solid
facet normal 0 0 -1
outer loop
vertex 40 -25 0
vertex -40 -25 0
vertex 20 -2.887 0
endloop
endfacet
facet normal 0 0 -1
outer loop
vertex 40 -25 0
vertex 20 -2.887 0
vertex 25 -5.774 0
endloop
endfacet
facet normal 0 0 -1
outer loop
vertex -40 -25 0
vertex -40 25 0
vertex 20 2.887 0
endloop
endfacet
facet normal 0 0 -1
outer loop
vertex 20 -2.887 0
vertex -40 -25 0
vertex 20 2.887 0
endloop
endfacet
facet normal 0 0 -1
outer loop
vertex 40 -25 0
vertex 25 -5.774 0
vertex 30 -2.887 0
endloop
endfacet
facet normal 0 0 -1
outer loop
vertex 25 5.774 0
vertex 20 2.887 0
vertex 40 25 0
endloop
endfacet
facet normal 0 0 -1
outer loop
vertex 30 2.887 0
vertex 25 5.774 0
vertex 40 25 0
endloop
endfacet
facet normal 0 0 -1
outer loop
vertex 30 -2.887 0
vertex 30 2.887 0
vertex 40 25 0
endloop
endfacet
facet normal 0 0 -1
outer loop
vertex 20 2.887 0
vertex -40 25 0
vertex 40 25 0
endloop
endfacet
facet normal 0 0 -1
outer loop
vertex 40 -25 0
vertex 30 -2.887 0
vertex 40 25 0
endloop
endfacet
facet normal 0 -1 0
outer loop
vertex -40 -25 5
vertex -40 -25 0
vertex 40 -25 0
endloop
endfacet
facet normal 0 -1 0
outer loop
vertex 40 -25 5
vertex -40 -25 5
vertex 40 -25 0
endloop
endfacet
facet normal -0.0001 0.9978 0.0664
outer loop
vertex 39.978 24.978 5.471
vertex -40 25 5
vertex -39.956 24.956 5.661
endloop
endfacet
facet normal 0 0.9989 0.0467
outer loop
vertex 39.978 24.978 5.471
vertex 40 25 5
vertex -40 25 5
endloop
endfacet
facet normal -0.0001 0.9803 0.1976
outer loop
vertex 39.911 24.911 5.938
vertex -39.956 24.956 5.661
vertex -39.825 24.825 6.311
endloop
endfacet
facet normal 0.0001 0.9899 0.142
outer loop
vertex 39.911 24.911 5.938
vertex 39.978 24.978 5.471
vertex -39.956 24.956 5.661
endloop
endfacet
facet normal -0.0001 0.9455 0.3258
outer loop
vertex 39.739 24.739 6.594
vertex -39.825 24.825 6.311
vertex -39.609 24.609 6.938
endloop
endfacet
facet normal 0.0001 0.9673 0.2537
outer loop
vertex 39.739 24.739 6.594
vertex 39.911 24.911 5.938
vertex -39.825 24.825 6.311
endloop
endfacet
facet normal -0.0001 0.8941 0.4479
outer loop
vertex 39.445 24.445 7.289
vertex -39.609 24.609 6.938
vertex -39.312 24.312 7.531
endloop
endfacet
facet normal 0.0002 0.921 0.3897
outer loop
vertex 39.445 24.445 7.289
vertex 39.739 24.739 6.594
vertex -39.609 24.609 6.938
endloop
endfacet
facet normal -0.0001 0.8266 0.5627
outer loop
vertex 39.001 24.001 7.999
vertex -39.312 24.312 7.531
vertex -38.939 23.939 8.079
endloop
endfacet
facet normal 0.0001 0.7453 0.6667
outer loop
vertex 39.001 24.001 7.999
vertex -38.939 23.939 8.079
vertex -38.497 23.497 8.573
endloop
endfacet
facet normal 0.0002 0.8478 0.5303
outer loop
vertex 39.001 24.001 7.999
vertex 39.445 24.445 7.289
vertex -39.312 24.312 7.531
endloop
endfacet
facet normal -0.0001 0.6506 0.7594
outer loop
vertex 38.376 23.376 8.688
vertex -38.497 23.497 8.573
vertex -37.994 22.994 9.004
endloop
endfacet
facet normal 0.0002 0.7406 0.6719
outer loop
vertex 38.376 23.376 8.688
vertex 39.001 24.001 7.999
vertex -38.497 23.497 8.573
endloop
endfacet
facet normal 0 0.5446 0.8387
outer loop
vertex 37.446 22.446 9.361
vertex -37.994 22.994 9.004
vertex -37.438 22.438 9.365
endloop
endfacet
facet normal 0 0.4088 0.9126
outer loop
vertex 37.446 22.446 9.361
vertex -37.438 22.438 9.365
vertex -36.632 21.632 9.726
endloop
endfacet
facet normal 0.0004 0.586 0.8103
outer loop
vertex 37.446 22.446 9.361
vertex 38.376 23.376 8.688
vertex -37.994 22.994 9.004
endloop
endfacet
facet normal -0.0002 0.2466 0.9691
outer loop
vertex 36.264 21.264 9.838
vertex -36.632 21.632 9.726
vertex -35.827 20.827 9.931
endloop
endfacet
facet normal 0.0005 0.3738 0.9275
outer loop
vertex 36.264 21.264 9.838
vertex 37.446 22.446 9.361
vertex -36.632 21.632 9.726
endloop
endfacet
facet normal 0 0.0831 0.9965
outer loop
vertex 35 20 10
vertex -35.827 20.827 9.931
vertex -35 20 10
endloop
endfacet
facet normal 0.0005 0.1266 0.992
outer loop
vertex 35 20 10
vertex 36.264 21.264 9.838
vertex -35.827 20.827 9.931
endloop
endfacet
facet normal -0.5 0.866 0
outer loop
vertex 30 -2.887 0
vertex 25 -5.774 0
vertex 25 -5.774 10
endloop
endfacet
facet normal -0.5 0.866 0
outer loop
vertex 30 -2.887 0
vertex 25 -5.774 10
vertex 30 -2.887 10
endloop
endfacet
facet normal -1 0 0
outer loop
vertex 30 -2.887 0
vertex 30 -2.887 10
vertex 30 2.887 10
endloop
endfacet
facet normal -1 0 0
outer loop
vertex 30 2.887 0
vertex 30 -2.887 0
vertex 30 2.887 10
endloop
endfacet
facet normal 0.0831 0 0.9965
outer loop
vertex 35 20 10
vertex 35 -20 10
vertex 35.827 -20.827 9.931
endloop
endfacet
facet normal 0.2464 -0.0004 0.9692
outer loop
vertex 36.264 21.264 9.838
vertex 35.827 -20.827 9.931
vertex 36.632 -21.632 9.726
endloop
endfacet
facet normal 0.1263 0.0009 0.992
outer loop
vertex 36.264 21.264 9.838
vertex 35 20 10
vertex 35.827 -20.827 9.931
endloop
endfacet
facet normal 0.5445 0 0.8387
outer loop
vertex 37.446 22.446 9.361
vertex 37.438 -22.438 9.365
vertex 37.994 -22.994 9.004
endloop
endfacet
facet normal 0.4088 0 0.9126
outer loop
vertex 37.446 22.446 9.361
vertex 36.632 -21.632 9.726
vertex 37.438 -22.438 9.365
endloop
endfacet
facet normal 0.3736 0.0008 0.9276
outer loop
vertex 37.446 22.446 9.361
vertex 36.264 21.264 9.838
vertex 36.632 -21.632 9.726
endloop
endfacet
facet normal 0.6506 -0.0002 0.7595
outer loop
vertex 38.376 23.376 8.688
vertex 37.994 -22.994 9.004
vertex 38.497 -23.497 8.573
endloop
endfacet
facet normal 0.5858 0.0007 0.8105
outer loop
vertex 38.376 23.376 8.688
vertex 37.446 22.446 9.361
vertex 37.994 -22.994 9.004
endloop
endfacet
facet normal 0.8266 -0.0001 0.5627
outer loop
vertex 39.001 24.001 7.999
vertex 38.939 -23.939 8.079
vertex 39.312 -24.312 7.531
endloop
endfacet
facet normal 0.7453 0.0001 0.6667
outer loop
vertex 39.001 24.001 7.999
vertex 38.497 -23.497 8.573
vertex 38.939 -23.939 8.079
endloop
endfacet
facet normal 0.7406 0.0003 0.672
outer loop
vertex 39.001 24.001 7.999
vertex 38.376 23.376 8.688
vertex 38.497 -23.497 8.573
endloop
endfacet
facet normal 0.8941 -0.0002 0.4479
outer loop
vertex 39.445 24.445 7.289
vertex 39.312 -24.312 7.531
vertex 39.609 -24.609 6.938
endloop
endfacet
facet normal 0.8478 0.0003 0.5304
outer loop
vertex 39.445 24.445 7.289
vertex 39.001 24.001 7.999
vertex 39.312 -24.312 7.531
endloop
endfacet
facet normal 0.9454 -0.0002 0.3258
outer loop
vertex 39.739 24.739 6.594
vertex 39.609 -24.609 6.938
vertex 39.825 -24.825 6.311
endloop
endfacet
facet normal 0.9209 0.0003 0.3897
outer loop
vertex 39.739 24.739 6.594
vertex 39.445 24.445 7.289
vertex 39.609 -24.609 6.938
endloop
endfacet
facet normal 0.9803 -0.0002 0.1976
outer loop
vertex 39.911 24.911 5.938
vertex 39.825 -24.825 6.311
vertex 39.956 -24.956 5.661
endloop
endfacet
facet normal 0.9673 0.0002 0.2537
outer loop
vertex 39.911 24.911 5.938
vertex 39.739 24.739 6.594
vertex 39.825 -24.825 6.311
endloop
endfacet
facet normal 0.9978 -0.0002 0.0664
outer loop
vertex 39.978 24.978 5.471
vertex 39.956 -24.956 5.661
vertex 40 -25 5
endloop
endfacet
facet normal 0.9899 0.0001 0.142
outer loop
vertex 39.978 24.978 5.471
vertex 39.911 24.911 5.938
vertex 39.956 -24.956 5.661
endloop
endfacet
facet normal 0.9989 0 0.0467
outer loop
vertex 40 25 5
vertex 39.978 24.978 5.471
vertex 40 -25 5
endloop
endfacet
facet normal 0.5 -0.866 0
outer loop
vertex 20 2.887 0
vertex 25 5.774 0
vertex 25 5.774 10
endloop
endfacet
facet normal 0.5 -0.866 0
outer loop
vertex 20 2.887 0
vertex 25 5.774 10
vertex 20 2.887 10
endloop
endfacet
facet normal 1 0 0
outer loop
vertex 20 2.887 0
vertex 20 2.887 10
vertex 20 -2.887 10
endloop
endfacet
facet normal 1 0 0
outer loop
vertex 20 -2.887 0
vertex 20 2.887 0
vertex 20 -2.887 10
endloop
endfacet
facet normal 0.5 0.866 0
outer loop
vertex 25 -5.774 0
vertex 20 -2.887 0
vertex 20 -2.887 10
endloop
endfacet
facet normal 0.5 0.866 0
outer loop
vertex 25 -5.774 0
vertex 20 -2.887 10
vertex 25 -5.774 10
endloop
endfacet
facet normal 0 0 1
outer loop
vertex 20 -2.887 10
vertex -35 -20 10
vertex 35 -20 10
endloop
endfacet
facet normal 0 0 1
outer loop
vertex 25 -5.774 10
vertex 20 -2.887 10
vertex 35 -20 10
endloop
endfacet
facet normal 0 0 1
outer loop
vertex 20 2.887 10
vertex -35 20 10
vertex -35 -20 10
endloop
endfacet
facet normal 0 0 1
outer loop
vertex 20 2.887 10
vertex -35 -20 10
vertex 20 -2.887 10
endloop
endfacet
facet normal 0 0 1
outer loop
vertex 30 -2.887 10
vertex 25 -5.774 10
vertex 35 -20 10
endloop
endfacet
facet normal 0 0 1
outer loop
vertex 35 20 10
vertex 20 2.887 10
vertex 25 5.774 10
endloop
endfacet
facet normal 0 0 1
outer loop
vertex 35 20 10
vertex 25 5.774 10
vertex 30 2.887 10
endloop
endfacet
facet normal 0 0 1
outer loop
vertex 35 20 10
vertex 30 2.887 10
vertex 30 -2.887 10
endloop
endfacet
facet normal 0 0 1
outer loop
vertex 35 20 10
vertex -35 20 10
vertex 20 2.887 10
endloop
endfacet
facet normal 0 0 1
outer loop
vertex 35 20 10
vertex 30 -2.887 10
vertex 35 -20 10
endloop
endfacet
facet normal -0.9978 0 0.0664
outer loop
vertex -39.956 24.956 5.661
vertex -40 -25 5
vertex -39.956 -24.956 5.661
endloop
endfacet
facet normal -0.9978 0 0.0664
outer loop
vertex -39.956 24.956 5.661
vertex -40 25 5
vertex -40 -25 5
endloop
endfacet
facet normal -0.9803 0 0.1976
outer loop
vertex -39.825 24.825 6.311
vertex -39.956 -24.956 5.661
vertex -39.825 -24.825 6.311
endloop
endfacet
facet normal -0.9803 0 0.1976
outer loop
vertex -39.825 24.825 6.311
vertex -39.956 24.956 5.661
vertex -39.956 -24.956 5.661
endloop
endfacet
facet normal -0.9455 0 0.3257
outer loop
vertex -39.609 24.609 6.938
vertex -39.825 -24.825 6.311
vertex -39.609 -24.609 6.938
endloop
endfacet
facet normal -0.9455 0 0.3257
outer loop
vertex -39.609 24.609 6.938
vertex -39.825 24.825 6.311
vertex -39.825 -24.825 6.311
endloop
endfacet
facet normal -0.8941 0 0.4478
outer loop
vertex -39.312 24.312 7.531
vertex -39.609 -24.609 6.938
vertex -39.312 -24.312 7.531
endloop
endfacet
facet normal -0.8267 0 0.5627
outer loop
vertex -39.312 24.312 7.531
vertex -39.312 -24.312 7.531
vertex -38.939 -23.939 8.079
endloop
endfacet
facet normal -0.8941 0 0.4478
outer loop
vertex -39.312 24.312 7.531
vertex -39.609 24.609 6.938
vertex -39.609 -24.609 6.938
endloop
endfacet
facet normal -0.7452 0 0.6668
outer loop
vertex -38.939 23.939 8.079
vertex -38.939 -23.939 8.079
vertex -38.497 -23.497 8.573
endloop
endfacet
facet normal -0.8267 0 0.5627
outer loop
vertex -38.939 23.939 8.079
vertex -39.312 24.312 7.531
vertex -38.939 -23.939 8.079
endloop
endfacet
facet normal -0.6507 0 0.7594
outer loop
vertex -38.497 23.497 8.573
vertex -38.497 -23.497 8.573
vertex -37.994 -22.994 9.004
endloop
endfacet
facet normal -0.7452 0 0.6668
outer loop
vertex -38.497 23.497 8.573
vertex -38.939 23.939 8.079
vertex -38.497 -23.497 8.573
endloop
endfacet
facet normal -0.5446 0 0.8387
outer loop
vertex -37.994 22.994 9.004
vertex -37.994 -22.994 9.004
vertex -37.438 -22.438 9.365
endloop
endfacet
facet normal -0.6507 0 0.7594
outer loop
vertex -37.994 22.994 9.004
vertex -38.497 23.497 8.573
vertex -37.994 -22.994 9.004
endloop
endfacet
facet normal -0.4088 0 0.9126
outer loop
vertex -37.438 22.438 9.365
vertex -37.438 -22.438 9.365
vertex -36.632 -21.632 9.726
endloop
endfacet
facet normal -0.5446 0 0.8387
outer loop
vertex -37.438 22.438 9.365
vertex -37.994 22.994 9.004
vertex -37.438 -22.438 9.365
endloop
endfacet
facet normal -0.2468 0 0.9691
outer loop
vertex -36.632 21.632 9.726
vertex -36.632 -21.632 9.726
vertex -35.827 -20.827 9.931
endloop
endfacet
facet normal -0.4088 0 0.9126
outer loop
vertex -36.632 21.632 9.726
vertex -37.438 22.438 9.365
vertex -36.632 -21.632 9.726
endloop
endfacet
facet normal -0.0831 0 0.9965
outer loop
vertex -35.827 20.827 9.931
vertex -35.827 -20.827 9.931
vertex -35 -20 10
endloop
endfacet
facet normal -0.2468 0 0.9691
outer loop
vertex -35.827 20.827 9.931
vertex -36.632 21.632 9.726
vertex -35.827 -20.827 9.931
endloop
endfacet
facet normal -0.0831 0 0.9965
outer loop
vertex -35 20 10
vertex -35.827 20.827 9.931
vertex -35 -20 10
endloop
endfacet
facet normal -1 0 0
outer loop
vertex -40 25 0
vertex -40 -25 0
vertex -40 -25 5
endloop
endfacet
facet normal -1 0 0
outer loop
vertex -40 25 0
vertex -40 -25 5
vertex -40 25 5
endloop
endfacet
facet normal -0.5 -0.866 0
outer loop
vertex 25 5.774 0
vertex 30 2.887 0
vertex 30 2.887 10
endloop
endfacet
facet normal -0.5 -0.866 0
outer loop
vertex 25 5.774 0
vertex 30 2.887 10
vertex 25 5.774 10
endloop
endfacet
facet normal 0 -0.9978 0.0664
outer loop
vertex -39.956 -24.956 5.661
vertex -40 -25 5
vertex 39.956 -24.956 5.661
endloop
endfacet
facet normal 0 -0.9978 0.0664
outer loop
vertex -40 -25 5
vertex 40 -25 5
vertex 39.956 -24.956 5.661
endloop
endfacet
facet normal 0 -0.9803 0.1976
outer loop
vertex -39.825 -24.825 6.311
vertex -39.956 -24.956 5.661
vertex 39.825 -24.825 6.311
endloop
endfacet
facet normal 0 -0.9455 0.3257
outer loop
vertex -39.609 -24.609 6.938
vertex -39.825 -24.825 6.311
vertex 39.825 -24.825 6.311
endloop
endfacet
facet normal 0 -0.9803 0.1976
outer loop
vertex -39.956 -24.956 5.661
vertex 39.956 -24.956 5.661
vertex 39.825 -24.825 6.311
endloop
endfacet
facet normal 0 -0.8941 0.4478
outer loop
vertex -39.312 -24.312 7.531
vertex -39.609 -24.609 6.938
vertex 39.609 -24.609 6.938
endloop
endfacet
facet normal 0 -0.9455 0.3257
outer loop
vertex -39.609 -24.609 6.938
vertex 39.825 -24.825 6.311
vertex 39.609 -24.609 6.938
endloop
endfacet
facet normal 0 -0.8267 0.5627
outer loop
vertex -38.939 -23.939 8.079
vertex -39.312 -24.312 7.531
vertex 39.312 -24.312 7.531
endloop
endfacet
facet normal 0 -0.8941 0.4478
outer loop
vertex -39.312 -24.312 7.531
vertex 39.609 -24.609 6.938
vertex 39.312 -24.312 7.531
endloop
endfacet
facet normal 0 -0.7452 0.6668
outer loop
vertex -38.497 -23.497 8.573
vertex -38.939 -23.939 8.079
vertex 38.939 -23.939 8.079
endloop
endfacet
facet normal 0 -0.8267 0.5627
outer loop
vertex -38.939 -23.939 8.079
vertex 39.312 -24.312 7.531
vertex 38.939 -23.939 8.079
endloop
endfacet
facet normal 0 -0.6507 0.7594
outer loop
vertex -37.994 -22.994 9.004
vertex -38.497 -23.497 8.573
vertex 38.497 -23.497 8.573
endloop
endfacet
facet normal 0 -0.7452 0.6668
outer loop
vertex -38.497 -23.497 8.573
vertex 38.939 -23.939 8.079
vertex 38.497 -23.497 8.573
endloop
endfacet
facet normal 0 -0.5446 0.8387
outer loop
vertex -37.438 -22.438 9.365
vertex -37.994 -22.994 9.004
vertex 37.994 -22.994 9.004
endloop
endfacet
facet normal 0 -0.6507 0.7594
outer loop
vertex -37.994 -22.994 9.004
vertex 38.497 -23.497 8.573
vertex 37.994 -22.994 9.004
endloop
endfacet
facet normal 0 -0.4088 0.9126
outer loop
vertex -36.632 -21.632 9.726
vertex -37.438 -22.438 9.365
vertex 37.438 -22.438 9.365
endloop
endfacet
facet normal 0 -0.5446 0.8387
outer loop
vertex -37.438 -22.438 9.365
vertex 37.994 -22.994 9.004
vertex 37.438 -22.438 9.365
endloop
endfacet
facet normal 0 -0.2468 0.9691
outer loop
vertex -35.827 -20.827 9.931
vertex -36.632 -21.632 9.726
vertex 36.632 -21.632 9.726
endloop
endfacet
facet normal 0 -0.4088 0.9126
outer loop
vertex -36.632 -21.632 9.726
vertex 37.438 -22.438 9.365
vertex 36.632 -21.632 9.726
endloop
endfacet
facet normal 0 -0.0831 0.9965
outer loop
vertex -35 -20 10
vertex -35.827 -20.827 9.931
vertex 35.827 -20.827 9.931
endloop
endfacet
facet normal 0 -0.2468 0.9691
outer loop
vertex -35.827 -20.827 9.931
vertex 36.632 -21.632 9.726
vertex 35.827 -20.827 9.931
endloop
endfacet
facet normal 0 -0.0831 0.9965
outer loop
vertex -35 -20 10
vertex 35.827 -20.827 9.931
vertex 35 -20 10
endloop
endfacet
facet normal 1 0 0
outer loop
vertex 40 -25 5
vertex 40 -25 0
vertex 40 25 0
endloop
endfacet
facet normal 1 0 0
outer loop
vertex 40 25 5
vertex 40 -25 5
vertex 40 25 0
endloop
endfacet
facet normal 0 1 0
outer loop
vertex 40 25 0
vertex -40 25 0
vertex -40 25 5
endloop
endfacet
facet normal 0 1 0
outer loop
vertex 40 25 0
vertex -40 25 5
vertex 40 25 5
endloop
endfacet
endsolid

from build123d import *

# Parameters (mm, degrees)
F0_W     = 80
F0_H     = 50
F1_DEPTH = 10
F3_DEPTH = 15
F4_R     = 5


with BuildPart() as f1:
    # F0 (on Top) → F1 (new body)
    with BuildSketch(Plane.XY):
        Rectangle(F0_W, F0_H)
    extrude(amount=F1_DEPTH)

    # F2 (on face) → F3 (cut)
    with BuildSketch(Plane.XY.offset(10)):
        Polygon((25, -5.773503), (30, -2.886751), (30, 2.886751), (25, 5.773503), (20, 2.886751), (20, -2.886751), align=None)
    extrude(amount=-F3_DEPTH, mode=Mode.SUBTRACT)

    # F4
    f4_edges = [f1.edges().sort_by_distance(p)[0] for p in [
        (0, -25, 10),
        (40, 0, 10),
        (0, 25, 10),
        (-40, 0, 10),
    ]]
    fillet(f4_edges, radius=F4_R)


solid = f1.part
